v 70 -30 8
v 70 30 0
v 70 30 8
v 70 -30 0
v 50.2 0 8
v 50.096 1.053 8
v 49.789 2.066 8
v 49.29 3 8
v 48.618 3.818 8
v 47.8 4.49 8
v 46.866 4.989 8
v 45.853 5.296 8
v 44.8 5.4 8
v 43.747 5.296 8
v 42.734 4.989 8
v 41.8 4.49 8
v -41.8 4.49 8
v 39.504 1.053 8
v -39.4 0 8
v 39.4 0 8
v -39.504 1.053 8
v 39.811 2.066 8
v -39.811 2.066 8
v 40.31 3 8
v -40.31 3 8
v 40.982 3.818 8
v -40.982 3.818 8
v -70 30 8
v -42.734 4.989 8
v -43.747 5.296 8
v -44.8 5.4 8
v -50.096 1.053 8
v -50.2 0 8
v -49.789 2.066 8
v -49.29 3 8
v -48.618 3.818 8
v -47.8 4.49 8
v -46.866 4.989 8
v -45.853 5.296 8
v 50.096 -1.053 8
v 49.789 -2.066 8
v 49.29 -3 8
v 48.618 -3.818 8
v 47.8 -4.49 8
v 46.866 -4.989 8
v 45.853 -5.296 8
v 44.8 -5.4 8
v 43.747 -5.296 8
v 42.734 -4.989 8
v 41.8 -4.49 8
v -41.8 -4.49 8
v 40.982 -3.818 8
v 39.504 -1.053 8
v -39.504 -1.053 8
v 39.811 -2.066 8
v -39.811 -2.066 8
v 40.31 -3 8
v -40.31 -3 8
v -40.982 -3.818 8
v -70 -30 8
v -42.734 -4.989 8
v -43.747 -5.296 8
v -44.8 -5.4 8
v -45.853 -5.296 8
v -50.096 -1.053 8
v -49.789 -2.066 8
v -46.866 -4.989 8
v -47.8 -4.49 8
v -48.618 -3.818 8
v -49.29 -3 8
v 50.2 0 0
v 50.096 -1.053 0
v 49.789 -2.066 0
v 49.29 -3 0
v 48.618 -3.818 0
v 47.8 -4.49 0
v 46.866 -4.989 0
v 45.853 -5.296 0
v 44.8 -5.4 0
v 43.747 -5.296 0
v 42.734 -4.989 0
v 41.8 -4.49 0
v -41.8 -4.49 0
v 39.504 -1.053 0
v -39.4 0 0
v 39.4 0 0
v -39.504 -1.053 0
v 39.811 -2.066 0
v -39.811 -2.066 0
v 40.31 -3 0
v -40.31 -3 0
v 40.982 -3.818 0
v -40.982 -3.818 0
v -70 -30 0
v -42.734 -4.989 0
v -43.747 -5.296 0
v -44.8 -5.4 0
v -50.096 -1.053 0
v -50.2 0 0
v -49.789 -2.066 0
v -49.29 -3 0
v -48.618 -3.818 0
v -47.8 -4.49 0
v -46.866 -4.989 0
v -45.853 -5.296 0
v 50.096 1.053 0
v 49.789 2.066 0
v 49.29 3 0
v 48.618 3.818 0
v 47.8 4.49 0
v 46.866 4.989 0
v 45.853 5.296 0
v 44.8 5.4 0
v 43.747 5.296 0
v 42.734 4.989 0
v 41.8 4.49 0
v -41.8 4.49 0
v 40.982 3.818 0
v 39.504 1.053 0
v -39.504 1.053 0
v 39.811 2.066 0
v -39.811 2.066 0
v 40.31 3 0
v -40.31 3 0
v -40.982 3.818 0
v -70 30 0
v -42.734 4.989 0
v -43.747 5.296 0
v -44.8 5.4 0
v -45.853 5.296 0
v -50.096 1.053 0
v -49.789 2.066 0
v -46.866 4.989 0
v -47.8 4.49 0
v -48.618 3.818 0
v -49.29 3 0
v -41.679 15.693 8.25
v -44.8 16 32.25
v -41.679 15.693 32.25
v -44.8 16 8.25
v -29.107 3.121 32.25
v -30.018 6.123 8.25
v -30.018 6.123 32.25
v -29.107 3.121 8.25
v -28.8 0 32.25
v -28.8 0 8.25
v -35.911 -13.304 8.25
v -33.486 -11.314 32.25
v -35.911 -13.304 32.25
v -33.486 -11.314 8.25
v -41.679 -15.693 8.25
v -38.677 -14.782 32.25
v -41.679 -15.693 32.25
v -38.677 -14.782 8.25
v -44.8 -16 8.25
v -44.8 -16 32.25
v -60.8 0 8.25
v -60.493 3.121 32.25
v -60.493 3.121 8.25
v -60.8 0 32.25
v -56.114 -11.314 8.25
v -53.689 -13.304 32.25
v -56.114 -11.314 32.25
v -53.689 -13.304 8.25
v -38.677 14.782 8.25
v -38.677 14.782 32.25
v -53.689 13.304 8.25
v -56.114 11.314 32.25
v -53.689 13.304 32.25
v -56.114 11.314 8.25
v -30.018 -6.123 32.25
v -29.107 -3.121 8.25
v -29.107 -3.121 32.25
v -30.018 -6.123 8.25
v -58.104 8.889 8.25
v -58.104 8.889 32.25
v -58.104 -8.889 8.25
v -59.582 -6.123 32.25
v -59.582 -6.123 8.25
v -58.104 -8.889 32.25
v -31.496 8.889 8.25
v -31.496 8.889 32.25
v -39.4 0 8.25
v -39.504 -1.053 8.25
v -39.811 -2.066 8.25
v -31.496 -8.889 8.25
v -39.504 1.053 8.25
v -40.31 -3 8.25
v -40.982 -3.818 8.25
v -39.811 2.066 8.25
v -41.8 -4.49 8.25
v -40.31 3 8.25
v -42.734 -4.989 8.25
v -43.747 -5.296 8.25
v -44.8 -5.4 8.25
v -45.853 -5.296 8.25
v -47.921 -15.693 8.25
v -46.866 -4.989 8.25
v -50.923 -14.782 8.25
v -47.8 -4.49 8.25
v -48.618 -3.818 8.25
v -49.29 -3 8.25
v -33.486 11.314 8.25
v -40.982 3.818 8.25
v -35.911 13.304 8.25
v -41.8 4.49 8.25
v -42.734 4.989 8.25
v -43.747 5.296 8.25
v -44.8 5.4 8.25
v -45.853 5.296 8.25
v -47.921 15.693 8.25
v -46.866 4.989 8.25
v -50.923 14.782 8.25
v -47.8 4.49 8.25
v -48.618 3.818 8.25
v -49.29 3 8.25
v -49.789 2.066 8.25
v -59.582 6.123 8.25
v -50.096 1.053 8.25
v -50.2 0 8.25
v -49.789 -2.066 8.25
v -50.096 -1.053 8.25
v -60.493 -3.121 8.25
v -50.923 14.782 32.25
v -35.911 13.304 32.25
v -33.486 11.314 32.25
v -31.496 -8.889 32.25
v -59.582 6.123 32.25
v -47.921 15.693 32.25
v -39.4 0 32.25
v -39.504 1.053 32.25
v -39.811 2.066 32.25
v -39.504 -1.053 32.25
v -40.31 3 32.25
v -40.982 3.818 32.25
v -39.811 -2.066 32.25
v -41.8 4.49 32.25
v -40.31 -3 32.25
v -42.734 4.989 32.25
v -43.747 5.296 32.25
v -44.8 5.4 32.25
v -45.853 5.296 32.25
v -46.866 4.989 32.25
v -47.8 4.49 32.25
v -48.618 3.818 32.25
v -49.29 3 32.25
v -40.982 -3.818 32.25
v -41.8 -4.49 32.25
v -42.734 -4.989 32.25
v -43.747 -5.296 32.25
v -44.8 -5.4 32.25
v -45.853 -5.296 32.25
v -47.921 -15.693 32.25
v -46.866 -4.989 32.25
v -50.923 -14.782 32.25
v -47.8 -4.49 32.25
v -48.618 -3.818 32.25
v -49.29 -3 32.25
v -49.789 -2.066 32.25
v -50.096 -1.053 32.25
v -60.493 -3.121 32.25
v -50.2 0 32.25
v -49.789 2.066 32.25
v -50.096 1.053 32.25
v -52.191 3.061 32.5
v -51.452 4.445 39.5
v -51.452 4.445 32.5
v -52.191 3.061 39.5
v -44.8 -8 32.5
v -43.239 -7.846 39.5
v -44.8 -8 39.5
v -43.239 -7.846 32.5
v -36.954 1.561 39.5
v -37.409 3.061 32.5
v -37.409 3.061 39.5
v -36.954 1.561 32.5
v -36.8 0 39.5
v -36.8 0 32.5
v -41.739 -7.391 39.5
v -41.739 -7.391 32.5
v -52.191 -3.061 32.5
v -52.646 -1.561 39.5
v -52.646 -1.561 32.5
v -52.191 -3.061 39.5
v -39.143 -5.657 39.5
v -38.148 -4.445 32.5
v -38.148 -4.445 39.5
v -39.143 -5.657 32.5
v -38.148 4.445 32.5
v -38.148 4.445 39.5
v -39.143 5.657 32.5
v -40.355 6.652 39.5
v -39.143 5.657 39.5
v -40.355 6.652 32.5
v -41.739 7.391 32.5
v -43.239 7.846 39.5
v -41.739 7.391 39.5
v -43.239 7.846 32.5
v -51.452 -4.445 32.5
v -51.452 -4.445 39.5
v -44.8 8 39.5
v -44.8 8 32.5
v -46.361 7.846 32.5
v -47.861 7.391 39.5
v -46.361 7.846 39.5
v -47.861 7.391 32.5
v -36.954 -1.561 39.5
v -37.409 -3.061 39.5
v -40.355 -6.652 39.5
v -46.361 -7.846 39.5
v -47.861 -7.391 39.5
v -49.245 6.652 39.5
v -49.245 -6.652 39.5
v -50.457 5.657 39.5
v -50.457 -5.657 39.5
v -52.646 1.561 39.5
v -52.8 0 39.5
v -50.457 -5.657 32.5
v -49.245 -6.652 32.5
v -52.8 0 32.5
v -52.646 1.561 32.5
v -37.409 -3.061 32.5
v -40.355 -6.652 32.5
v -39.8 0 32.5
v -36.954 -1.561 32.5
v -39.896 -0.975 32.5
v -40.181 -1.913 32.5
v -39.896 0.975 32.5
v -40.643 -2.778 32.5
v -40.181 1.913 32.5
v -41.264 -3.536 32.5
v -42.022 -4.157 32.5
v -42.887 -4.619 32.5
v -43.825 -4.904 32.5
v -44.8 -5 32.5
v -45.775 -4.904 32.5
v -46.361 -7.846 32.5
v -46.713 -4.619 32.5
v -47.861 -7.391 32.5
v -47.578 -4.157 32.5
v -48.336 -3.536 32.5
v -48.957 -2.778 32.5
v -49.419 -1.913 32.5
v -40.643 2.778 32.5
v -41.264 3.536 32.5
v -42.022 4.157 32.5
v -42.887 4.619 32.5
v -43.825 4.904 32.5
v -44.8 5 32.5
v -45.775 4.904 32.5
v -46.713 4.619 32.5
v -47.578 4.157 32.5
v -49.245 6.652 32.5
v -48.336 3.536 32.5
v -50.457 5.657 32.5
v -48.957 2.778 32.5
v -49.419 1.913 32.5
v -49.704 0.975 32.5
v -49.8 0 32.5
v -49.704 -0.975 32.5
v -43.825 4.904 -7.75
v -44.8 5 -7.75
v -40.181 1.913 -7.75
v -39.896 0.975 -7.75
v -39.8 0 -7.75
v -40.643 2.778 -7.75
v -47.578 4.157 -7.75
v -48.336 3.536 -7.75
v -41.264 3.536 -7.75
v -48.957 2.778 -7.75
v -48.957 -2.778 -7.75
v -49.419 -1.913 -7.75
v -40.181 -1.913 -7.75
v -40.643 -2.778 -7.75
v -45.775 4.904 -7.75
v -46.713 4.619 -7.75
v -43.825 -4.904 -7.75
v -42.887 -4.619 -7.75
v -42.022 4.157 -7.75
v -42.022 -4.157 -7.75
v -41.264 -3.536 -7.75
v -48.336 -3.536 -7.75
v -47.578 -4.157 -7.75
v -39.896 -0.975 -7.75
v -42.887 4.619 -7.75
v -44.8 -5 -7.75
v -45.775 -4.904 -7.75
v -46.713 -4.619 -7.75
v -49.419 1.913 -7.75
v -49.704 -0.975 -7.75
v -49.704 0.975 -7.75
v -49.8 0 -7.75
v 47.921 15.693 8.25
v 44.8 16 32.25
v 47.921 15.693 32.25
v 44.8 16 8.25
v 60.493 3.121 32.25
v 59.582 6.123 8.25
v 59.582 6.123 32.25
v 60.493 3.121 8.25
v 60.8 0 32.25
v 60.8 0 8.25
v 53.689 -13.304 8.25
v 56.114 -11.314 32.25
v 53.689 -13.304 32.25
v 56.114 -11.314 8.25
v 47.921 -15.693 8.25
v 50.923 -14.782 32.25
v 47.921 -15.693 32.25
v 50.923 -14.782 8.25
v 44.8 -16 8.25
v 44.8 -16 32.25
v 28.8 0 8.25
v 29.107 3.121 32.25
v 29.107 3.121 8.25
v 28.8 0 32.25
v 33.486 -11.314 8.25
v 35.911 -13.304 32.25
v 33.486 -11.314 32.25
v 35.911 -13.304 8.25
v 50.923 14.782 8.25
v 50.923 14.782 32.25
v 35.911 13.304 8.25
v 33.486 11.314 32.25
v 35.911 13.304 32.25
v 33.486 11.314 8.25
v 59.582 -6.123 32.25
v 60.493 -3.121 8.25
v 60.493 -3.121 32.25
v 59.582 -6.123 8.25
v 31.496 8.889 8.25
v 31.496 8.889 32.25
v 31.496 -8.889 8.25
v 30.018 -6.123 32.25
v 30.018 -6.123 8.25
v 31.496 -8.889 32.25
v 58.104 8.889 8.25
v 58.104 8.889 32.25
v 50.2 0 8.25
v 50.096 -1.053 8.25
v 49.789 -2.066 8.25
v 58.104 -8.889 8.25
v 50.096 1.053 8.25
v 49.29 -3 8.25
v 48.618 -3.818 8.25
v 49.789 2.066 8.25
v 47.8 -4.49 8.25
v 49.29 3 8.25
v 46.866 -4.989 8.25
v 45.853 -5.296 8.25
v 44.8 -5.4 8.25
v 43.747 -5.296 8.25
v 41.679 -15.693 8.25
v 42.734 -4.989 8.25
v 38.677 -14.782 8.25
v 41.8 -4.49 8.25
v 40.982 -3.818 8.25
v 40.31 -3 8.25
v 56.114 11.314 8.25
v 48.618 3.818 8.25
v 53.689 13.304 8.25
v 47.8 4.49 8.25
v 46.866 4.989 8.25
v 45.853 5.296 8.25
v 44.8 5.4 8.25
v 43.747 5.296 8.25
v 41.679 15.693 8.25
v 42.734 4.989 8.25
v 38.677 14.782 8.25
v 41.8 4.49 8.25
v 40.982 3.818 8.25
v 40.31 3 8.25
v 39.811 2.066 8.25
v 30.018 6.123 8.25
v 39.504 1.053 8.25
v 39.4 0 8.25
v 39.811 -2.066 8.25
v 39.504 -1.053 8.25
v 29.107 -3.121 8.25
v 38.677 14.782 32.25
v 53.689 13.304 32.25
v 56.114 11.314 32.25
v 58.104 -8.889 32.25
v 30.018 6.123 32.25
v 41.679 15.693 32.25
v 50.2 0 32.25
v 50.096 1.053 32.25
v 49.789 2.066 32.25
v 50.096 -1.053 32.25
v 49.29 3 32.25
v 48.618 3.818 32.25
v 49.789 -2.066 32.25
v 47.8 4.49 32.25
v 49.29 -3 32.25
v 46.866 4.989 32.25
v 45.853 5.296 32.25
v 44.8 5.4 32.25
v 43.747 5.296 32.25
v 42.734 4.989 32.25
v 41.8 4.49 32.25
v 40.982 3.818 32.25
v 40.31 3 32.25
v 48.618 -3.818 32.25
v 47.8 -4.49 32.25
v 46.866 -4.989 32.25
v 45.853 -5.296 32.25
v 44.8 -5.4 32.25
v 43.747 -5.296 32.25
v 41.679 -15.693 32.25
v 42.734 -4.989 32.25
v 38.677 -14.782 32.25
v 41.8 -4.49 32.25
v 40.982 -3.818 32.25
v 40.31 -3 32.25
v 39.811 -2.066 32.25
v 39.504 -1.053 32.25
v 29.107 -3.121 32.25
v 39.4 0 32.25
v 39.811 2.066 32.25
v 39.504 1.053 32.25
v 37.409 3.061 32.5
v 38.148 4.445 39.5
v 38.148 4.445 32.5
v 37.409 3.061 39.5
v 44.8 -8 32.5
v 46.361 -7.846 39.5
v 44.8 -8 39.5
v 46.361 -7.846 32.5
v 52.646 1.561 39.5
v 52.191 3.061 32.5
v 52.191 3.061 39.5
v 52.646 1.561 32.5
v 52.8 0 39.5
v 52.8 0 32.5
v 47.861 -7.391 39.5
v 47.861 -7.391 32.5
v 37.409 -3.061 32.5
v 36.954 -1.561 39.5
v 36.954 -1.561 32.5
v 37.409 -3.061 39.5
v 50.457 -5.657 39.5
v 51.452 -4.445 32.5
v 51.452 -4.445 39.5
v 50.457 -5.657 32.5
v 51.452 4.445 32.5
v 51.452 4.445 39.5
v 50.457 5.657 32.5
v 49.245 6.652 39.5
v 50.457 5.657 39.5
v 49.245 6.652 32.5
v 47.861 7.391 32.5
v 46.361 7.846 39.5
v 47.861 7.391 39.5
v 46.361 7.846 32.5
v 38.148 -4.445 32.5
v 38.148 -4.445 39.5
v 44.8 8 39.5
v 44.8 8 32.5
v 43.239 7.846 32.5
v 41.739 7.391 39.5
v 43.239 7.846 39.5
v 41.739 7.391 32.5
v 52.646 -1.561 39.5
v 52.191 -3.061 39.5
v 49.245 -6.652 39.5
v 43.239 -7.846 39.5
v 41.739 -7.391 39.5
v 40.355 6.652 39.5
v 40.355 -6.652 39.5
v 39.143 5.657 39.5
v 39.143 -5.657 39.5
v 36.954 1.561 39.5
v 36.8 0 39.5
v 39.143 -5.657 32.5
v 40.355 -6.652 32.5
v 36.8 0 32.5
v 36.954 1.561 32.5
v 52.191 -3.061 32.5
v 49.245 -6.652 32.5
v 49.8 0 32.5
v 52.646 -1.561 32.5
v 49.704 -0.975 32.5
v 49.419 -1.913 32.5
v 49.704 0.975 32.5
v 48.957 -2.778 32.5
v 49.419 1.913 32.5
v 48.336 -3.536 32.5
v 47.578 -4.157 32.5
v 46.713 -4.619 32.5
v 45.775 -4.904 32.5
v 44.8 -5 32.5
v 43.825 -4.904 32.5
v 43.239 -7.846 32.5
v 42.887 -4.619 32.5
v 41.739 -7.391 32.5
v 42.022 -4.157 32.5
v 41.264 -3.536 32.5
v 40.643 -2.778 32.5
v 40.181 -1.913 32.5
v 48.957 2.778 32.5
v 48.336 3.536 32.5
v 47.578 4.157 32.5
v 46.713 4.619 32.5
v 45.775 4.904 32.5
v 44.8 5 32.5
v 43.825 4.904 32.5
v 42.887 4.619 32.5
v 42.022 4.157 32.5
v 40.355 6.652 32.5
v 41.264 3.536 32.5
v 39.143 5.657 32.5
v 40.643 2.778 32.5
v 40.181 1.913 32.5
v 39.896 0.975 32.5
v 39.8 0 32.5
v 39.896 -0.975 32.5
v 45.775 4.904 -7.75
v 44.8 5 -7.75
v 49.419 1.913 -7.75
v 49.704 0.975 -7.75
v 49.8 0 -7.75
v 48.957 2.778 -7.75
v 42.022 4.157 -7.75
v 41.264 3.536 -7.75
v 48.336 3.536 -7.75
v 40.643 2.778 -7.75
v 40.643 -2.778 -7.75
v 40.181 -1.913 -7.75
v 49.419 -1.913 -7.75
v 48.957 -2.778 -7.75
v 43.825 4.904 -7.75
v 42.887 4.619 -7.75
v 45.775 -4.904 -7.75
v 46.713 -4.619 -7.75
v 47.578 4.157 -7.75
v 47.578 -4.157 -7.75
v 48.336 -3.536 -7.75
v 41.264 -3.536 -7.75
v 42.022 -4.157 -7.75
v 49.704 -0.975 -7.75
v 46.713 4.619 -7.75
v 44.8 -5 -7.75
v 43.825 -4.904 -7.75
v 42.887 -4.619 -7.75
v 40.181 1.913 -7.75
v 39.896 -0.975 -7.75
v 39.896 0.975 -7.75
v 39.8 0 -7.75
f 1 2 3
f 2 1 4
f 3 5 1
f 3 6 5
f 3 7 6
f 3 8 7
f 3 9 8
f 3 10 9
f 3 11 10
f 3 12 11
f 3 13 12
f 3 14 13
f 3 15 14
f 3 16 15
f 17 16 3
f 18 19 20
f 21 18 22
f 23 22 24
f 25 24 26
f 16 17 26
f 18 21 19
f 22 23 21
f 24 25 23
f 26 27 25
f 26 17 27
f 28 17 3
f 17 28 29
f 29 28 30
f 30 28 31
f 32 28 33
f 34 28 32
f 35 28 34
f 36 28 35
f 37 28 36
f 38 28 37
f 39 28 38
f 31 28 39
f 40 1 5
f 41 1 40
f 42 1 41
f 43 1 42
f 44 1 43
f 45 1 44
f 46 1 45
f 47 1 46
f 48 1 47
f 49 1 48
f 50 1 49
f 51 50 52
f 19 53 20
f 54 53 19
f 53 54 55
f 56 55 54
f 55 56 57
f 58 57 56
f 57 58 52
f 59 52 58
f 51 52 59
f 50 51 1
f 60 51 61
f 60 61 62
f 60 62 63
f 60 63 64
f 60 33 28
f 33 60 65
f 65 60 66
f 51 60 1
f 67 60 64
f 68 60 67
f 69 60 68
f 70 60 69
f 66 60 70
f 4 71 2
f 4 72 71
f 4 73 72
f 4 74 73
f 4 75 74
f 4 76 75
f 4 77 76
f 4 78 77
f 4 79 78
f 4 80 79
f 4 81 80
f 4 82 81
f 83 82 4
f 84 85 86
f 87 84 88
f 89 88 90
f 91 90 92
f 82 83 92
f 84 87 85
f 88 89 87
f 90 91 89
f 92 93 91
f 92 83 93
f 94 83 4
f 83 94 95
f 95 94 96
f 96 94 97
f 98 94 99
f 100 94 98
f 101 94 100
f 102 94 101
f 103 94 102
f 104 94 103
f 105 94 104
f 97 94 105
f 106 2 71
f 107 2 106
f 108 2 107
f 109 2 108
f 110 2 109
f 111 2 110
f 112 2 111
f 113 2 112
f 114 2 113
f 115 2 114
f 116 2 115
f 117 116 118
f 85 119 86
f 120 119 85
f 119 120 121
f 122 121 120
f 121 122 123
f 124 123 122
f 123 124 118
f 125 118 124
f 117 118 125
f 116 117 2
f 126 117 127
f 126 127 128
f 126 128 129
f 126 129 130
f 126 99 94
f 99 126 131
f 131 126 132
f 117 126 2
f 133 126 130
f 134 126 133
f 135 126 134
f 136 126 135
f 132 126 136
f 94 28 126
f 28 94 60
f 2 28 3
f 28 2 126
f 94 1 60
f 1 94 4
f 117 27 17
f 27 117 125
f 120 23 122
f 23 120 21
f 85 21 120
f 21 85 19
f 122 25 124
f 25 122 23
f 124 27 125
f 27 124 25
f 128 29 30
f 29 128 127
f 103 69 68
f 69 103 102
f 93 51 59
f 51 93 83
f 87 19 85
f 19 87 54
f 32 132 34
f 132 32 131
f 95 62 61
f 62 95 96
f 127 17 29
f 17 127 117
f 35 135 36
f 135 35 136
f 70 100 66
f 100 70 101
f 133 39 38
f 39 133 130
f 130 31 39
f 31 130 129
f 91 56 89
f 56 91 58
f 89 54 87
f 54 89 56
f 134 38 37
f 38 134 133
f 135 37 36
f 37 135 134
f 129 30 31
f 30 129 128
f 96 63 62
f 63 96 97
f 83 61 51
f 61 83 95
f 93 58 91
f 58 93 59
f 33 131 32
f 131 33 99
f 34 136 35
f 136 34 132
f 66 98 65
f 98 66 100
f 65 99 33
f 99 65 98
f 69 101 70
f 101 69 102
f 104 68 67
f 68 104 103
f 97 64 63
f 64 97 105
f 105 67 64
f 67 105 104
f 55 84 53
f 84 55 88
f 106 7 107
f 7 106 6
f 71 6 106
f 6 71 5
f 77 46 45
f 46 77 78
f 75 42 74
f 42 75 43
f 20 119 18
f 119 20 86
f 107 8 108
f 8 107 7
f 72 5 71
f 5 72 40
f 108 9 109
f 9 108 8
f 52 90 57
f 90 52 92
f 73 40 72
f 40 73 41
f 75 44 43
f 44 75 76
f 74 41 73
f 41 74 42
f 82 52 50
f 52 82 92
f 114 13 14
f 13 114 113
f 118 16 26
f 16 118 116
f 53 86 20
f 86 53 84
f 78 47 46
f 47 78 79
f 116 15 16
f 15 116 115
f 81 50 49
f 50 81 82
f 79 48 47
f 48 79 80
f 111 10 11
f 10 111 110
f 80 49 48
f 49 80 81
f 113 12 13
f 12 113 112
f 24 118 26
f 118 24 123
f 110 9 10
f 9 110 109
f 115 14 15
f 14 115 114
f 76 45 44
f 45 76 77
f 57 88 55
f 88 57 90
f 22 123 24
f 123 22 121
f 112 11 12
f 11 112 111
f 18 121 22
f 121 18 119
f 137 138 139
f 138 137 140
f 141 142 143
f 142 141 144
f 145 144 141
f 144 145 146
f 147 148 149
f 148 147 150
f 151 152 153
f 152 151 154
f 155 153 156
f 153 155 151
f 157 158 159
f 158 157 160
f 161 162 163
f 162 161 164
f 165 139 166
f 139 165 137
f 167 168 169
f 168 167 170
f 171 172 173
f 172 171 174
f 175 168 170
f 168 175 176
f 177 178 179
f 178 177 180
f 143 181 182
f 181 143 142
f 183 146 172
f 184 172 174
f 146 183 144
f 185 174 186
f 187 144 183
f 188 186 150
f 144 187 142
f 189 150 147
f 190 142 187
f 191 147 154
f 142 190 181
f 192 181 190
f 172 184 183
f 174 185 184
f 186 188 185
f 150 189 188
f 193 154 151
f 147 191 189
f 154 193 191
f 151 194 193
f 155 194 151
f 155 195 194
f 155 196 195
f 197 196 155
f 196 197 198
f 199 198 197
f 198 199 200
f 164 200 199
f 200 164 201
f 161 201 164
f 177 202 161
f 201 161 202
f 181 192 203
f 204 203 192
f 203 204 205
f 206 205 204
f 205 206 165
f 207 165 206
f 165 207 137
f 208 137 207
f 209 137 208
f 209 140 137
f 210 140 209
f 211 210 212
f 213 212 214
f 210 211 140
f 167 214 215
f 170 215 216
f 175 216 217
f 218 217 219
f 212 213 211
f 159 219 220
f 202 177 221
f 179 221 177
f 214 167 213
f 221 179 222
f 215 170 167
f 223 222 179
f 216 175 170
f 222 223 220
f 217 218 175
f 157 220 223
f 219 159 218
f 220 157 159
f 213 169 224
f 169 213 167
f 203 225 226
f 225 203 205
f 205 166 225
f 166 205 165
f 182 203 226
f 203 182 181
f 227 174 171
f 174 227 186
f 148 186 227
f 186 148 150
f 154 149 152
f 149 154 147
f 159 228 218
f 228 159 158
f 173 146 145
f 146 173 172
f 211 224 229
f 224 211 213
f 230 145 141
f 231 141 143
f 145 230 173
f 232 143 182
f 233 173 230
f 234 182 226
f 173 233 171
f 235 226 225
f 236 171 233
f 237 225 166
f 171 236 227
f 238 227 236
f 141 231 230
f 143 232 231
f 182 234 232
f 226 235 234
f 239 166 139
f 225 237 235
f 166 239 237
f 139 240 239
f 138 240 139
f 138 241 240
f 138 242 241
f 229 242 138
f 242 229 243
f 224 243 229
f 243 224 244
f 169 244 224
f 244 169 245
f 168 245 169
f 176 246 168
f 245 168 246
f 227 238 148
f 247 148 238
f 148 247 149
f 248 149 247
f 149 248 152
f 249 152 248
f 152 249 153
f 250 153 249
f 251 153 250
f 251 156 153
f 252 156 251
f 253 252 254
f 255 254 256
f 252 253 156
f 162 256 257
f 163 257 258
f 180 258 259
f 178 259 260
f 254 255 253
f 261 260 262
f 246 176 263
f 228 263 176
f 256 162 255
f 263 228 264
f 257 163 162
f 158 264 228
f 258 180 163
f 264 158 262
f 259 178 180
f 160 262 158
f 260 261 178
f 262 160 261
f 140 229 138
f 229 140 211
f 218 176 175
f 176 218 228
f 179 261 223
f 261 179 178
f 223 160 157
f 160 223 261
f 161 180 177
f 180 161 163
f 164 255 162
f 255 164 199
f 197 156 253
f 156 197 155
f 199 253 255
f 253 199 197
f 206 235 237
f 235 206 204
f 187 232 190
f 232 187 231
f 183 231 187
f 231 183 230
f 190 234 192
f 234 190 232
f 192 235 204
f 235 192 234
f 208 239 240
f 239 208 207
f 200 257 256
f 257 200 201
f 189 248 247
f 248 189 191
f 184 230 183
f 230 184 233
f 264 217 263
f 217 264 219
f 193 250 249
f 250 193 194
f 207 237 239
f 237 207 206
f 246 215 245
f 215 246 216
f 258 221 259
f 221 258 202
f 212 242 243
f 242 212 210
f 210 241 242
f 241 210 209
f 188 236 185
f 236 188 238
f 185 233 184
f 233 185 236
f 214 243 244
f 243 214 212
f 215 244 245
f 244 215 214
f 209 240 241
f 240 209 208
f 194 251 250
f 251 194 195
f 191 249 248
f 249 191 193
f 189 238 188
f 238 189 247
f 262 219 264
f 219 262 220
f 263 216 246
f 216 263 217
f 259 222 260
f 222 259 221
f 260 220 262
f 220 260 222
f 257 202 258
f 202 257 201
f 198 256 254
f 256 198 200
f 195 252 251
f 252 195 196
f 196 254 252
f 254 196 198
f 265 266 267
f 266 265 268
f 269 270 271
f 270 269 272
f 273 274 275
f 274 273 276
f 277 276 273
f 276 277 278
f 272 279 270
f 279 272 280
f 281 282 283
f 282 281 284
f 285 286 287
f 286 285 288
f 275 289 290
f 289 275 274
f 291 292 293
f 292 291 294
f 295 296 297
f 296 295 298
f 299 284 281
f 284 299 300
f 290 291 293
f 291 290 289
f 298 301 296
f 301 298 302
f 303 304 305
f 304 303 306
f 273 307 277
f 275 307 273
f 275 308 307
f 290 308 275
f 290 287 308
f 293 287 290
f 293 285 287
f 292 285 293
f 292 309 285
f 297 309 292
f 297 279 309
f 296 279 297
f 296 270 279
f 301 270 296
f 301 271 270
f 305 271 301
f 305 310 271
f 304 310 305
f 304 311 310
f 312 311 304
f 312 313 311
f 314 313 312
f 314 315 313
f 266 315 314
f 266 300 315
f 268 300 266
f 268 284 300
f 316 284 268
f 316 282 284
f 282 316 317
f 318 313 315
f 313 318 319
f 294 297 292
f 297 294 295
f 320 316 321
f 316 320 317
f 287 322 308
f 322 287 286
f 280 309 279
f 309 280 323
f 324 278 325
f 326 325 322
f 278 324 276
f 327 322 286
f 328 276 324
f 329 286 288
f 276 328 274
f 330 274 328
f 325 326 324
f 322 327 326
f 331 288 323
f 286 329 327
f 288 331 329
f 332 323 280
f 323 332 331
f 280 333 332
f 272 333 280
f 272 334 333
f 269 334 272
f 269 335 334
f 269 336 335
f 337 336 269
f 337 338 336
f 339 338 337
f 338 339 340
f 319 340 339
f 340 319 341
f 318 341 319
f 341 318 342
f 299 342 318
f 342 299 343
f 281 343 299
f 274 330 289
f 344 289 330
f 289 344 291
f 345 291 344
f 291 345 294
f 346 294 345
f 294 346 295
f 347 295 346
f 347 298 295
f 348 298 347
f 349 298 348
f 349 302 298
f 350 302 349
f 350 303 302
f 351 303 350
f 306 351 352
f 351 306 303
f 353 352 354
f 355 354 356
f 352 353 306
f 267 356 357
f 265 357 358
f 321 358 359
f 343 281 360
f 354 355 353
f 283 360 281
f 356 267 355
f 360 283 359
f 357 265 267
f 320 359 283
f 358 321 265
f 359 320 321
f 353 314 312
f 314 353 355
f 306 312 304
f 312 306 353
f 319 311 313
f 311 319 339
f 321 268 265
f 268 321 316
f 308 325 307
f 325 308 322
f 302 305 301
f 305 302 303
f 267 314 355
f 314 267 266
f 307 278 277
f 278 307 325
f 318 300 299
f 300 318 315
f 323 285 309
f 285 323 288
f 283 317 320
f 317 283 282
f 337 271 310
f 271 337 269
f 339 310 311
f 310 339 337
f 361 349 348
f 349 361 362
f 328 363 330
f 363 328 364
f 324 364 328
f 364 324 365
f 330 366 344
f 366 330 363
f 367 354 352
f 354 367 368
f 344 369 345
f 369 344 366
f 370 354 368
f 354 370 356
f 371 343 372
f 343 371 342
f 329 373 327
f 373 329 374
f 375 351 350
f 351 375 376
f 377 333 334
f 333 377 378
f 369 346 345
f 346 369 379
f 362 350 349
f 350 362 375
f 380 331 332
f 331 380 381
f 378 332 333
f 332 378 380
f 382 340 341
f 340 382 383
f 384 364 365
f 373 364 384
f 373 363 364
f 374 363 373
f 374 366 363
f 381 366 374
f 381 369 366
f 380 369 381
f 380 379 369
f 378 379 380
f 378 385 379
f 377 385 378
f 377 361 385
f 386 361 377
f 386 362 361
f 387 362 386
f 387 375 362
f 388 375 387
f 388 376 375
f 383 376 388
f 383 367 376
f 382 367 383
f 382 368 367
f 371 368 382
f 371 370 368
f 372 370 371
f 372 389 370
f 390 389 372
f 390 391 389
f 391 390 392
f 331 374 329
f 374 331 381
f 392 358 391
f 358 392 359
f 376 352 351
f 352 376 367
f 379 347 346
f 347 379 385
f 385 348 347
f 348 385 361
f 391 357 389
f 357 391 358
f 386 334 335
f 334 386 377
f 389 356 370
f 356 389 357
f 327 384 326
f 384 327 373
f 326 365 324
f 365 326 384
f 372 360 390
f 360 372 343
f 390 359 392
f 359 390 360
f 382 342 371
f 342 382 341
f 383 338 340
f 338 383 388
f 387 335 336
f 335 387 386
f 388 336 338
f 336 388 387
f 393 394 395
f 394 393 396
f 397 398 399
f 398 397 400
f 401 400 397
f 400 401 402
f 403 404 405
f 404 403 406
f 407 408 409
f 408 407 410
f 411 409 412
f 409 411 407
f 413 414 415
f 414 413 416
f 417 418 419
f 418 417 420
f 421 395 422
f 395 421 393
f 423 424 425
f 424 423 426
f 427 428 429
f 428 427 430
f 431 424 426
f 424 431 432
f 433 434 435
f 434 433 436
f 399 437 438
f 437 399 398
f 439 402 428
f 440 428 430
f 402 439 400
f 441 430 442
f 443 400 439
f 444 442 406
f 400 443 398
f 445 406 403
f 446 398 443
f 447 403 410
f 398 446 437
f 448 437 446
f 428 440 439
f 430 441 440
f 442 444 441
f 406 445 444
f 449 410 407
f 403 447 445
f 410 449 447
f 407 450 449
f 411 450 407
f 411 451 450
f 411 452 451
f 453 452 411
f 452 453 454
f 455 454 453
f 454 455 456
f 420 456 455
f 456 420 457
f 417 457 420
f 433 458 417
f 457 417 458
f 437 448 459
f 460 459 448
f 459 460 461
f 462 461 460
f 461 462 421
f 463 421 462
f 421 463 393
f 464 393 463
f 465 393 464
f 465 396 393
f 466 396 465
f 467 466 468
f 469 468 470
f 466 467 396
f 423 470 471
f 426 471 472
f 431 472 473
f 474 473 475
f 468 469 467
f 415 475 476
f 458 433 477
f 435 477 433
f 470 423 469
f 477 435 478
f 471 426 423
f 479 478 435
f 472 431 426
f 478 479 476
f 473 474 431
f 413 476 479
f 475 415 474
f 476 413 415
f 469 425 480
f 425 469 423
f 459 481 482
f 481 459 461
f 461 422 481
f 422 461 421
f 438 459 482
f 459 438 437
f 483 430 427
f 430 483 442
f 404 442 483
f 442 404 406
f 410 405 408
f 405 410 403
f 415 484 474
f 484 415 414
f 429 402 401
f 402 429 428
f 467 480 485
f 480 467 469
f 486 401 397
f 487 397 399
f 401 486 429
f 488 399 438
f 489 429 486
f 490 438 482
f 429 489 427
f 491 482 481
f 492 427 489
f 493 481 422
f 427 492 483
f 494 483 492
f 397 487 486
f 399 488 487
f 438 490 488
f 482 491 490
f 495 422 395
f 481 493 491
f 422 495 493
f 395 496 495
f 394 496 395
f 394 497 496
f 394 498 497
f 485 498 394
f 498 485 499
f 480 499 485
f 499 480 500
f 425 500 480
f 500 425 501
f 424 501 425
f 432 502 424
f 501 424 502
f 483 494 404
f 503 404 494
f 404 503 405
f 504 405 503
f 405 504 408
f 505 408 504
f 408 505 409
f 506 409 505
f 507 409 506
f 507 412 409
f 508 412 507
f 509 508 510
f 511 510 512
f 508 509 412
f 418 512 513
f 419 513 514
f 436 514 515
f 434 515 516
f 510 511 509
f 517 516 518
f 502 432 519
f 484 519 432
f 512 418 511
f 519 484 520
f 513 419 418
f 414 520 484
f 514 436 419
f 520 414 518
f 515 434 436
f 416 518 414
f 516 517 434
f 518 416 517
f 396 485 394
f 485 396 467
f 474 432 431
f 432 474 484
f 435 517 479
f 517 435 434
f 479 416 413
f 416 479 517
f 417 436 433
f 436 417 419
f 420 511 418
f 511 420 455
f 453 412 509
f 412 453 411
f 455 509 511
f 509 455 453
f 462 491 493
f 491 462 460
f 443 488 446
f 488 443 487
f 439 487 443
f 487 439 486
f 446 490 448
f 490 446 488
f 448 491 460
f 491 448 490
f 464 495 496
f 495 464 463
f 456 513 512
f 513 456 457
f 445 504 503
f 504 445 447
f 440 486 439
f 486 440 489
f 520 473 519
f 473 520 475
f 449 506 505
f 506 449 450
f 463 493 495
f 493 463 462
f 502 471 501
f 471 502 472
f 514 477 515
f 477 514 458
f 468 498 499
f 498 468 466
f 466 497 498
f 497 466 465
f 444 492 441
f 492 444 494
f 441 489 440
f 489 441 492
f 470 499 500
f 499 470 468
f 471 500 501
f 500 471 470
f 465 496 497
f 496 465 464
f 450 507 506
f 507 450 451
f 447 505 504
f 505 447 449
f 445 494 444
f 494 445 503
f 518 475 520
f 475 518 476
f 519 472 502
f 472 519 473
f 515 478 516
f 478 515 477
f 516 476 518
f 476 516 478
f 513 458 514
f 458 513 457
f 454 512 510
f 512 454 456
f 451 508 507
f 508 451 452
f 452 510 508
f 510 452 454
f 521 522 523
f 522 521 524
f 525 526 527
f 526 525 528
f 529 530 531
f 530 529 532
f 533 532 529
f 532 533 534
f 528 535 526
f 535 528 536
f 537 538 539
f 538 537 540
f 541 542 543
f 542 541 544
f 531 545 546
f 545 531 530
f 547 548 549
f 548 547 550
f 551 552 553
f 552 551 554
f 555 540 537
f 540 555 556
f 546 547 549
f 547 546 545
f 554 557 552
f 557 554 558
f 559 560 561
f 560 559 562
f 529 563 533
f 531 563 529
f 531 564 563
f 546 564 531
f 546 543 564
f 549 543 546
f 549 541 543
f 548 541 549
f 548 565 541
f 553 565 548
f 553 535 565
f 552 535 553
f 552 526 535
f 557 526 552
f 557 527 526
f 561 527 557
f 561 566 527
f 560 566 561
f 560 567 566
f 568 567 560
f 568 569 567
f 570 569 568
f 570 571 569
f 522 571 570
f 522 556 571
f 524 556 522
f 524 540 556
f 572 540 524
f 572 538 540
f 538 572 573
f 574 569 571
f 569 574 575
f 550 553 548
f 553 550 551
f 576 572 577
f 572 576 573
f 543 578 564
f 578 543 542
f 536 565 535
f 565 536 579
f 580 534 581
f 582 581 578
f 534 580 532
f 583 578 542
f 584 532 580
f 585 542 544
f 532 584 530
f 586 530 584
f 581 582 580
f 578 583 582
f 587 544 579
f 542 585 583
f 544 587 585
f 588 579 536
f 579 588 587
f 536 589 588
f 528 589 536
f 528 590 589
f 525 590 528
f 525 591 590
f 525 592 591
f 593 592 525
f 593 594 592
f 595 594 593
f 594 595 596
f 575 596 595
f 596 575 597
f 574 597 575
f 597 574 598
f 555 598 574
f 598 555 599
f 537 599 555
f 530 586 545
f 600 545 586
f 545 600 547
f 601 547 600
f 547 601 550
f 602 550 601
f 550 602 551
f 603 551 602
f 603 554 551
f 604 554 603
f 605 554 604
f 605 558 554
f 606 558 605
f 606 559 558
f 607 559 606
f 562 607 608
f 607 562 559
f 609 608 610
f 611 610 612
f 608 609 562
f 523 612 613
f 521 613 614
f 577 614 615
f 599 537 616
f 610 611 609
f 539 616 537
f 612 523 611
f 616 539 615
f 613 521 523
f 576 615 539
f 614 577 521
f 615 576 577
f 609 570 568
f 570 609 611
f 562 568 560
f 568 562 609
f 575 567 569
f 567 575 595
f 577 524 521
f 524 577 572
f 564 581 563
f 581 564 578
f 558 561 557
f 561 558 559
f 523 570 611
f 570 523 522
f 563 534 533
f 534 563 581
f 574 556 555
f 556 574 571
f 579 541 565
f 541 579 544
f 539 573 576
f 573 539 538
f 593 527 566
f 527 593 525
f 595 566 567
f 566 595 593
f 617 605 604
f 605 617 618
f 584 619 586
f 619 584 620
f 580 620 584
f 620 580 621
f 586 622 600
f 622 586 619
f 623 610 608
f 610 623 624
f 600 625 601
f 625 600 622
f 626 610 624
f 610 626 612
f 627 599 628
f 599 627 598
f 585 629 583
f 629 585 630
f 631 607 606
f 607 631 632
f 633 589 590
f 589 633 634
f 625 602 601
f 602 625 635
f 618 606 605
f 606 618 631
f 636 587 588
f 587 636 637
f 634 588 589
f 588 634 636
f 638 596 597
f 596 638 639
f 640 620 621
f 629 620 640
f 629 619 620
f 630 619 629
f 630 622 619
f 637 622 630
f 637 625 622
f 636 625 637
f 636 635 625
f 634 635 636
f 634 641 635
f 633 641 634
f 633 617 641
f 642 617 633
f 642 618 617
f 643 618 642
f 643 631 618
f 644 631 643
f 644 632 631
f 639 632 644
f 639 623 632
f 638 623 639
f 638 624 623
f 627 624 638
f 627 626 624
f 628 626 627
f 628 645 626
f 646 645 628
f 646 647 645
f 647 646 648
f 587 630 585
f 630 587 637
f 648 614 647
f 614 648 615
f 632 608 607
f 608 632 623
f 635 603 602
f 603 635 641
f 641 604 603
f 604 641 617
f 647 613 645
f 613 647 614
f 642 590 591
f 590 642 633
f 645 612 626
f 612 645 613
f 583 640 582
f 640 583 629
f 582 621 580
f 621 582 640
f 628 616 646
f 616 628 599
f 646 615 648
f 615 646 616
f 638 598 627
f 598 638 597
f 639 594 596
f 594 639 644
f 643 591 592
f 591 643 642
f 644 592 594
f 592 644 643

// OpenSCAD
$fn = 32;

// ------------------------------------------------------------------------
// Standoff columns: 2 d32 standoffs, bolts d10
// Every part is its own module, assembly() places them once.
// ------------------------------------------------------------------------

// --- part 1 ---
module base_plate() {
  difference() {
    translate([-70, -30, 0]) cube([140, 60, 8]);
    translate([-44.8, 0, -1]) cylinder(h = 10, d = 10.8);
    translate([44.8, 0, -1]) cylinder(h = 10, d = 10.8);
  }
}

// --- part 2 ---
module spacer1() {
  difference() {
      translate([0, 0, 0]) cylinder(h = 24, d = 32);
      translate([0, 0, -1]) cylinder(h = 26, d = 10.8);
    }
}

// --- part 3 ---
module bolt1() {
  cylinder(h = 7, d = 16);
  translate([0, 0, -40.25]) cylinder(h = 40.25, d = 10);
}

// --- part 4 ---
module spacer2() {
  difference() {
      translate([0, 0, 0]) cylinder(h = 24, d = 32);
      translate([0, 0, -1]) cylinder(h = 26, d = 10.8);
    }
}

// --- part 5 ---
module bolt2() {
  cylinder(h = 7, d = 16);
  translate([0, 0, -40.25]) cylinder(h = 40.25, d = 10);
}

// --- assembly ---
module assembly() {
  translate([0, 0, 0]) rotate([0, 0, 0]) base_plate();
  translate([-44.8, 0, 8.25]) rotate([0, 0, 0]) spacer1();
  translate([-44.8, 0, 32.5]) rotate([0, 0, 0]) bolt1();
  translate([44.8, 0, 8.25]) rotate([0, 0, 0]) spacer2();
  translate([44.8, 0, 32.5]) rotate([0, 0, 0]) bolt2();
}

assembly();
